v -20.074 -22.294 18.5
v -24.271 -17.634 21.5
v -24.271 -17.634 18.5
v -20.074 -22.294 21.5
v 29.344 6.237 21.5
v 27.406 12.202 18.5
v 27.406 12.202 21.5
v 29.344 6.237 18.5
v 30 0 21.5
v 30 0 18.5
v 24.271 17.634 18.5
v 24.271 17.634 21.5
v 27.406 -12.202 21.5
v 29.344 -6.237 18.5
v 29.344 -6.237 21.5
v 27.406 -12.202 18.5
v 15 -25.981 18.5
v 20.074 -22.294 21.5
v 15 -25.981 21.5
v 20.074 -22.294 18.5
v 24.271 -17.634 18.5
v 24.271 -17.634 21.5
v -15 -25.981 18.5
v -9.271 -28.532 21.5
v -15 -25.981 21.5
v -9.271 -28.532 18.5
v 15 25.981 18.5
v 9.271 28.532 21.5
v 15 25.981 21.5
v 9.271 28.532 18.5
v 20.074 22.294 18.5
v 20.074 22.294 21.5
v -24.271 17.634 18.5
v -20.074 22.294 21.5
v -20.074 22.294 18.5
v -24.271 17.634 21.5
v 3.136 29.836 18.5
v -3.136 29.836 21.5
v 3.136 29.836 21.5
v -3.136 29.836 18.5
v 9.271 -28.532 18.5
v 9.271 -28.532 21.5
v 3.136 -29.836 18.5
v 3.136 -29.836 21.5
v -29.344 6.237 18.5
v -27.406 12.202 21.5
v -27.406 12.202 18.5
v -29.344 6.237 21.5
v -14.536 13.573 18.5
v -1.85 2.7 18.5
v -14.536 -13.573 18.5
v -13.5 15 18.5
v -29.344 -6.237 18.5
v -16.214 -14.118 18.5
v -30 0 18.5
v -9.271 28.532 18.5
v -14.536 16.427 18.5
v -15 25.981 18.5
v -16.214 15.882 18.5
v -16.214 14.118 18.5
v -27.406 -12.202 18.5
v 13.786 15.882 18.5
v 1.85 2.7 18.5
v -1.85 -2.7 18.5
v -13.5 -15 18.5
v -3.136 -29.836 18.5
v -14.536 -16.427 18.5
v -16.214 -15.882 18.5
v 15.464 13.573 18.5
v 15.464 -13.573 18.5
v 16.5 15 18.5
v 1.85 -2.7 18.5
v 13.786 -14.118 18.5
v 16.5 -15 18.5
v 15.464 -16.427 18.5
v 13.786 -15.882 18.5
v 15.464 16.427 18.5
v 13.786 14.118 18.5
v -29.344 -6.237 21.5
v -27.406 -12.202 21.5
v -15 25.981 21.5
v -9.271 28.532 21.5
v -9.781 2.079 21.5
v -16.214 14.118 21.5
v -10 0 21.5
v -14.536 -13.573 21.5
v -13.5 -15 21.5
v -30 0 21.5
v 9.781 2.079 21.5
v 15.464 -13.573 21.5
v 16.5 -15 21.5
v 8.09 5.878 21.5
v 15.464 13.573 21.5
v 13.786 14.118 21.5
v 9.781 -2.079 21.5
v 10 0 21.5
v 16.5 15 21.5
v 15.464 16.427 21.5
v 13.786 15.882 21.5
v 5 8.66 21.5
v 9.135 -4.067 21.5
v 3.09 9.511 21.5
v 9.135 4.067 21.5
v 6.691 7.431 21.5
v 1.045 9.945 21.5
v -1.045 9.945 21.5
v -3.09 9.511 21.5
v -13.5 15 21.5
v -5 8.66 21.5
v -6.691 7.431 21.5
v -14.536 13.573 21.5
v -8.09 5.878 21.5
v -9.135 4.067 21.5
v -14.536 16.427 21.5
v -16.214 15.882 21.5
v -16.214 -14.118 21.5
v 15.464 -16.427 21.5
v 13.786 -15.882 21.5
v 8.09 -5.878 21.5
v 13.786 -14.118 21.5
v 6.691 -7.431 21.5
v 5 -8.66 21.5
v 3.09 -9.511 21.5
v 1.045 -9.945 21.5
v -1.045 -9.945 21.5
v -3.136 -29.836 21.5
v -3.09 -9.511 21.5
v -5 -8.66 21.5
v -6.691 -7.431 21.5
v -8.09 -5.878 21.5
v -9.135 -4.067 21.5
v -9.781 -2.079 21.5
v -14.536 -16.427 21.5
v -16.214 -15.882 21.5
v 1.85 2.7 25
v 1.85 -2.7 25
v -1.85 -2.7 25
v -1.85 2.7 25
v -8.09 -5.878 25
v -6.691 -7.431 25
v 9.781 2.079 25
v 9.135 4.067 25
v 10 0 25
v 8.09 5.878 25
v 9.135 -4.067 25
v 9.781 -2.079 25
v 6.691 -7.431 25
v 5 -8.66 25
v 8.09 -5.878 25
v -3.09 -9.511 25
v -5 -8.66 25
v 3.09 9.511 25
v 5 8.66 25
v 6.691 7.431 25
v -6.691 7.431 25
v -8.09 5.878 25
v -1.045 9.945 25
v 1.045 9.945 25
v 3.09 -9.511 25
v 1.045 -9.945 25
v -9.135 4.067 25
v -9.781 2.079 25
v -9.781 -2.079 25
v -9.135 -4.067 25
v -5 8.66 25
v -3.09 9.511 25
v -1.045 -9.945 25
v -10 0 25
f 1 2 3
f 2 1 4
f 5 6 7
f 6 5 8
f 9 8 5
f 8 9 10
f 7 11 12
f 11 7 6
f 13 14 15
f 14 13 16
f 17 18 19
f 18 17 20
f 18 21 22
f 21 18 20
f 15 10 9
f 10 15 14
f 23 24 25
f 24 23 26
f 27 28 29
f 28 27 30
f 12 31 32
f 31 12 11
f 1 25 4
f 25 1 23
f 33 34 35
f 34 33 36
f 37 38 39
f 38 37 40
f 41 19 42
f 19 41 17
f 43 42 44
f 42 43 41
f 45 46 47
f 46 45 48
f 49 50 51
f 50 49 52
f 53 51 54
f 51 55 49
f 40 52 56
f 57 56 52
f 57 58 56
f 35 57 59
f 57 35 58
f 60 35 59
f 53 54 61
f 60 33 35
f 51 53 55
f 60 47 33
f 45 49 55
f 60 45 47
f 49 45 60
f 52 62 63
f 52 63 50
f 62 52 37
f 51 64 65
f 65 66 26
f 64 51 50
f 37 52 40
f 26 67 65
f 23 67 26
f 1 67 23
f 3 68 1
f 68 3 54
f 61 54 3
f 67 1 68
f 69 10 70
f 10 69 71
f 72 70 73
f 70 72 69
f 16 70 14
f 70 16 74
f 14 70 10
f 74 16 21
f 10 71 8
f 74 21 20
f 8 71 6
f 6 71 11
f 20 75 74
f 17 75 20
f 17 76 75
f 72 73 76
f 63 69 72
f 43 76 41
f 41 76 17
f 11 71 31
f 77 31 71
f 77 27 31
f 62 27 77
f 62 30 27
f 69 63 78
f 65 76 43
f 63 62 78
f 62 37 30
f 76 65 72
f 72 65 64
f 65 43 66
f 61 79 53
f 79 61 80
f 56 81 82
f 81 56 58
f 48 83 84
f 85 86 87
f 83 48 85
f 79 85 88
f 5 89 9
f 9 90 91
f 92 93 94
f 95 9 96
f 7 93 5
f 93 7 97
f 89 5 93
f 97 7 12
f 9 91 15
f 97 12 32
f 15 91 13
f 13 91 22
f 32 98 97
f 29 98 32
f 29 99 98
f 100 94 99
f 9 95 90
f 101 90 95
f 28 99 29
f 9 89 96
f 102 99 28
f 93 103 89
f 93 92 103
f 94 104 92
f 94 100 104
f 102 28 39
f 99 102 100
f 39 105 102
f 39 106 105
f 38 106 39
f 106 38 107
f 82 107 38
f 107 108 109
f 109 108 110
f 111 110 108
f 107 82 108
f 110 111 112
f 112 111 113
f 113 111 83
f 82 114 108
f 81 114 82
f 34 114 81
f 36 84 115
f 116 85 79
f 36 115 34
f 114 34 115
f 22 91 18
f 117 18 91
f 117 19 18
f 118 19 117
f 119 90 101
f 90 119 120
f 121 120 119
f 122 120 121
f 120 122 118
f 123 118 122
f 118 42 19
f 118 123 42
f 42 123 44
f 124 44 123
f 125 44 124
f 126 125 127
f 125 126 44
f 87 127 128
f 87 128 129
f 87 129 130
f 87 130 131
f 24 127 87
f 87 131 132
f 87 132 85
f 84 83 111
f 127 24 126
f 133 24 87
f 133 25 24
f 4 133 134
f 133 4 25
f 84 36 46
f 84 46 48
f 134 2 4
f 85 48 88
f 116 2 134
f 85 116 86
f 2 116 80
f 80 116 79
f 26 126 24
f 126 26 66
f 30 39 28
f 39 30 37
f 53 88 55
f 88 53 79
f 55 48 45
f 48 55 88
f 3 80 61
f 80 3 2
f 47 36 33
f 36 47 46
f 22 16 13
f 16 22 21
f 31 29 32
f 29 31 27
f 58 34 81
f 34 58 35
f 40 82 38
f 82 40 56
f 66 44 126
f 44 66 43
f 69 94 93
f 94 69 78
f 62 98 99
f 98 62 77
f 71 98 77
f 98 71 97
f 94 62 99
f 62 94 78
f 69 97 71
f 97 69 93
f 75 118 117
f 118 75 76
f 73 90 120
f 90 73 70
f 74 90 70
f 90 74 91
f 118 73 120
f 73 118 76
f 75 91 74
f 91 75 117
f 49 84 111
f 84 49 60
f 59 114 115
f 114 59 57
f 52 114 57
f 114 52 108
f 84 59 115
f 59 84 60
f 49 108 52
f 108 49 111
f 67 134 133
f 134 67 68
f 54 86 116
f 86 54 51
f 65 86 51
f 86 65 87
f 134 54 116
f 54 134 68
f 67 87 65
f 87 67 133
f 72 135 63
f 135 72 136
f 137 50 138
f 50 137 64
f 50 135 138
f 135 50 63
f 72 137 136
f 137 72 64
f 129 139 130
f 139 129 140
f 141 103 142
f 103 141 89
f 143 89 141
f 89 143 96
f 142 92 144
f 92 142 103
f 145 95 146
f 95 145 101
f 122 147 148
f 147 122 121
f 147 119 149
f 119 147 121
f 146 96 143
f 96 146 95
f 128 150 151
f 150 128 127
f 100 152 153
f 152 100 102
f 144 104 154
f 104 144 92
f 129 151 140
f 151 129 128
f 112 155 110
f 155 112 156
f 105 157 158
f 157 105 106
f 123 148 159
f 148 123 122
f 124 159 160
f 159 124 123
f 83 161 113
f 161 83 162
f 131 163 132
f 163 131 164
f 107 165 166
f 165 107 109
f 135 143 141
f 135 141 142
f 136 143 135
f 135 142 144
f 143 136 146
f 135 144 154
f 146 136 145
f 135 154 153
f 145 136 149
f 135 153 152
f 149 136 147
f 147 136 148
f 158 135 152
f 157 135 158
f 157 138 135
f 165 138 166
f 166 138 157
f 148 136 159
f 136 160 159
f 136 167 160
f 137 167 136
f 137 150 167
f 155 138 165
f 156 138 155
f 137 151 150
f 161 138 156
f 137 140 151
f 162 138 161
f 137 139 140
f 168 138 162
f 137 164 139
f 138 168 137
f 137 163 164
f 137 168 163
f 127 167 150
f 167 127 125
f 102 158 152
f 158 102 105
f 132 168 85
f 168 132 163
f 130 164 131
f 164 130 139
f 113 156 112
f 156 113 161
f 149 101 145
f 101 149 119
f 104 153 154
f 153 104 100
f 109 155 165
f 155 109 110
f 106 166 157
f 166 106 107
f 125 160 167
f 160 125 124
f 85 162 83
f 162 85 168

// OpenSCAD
/*module springTrigger(minRadius, maxRadius, vertexCount, startPoint, height) {
	function vertexAt(vertexIndex) = 
		let(fraction = vertexIndex / vertexCount)
		let(angle = fraction * 360) 
		let(lengthFraction = vertexIndex > startPoint ? fraction : startPoint / vertexCount)
		let(length = minRadius + lengthFraction * (maxRadius - minRadius)) 
		[cos(angle) * length, sin(angle) * length];
	
	range = [0:(vertexCount-1)];
	path = [for (i = range) i];
	vertices = [for (i = range) vertexAt(i)];

	linear_extrude(height = height) polygon(points=vertices, paths=[path]);
}*/

/*module drawSpring() {
	springTrigger(5,17, 500, 50, 8);
}*/

module drawTire() {
	tireWidth = 40;
	//cylinder(h = tireWidth, r=51, center=true);
	color([1,0,0]) translate([0, 0, tireWidth / 2]) {
		difference() {
			cylinder(h = 3, r=30, center=true);
			translate([15, 15, 0]) cylinder(h = 4, r=1.5, center=true);
			translate([15, -15, 0]) cylinder(h = 4, r=1.5, center=true);
			translate([-15, 15, 0]) cylinder(h = 4, r=1.5, center=true);
			translate([-15, -15, 0]) cylinder(h = 4, r=1.5, center=true);
			cube([3.7,5.4,5], center = true);
			
		}
		
		difference() {
			translate ([0, 0, 2])cylinder(h = 6, r=10, center=true);
			cube([3.7,5.4,15], center = true);
		}
	}
	
	/*color([1,0,0]) translate([0, 0, -tireWidth / 2]) {
		difference() {
			cylinder(h = 3, r=30, center=true);
			translate([15, 15, 0]) cylinder(h = 4, r=1.5, center=true);
			translate([15, -15, 0]) cylinder(h = 4, r=1.5, center=true);
			translate([-15, 15, 0]) cylinder(h = 4, r=1.5, center=true);
			translate([-15, -15, 0]) cylinder(h = 4, r=1.5, center=true);	
		}
	}*/
}

drawTire();

module drawAllParts() {
	color([1,1,1]) translate([0,27,0]) rotate([90,90,0]) drawSpring();
	
	tireDistance = 90;
	translate([0,-tireDistance,0]) rotate([90,90,0]) mirror([0,0,1]) drawTire();
	translate([0,tireDistance,0]) rotate([90,90,0]) drawTire();
	
	//drawTheRest();
}

//drawAllParts();

// Moottorin kotelon leveä sivu: 22,5mm
// Moottorin kotelon pituus: 64,27mm

// Akselin etäisyys kotelon reunasta: 8,5mm
// Kotelo alkaa levenemään 36,75mm kohdalla

// Moottorin akselin kapea sivu: 3,7mm, leveä sivu: 5,4mm (leveä sivu on kaareva)
// (36,9mm - 18,6mm) / 2 - 2mm = 7,15mm

// Servon akselin kapea sivu: 2,4mm, leveä sivu: 3,0mm 

// 3.05 1.778

module drawTheRest() {
	axisWidth = 23;
	axisDistance = tireDistance - tireWidth / 2 - axisWidth / 2;
	
	color([0,1,0]) {

		//Read axises
		translate([0,-axisDistance,0]) rotate([90,90,0]) cylinder(h = axisWidth, r=3, center=true);
		translate([0,axisDistance,0]) rotate([90,90,0]) cylinder(h = axisWidth, r=3, center=true);

		//Servo axis
		translate([0,20,0]) rotate([90,90,0]) cylinder(h = 10, r=3, center=true);

		translate([0,0,-7]) {
			difference() {
				cube(size = [50,100,2], center = true);
				translate([0,23,0]) cube([35,12,4], center = true);
			}
			
			// Teensy motors 
			translate([5,-45,6]) cube(size = [64.27,22.5,18.6], center = true); 
			translate([5,45,6]) cube(size = [64.27,22.5,18.6], center = true);
			
			// Teensy
			translate([0,-20,2]) cube(size = [30.5,17.8,3], center = true);
			
			// Battery
			translate([0,-20,-6]) cube(size = [40,60,10], center = true);
			
			// Spring servo
			translate([0,5,6]) cube(size = [20,20,10], center = true);
		}		
	}
}
